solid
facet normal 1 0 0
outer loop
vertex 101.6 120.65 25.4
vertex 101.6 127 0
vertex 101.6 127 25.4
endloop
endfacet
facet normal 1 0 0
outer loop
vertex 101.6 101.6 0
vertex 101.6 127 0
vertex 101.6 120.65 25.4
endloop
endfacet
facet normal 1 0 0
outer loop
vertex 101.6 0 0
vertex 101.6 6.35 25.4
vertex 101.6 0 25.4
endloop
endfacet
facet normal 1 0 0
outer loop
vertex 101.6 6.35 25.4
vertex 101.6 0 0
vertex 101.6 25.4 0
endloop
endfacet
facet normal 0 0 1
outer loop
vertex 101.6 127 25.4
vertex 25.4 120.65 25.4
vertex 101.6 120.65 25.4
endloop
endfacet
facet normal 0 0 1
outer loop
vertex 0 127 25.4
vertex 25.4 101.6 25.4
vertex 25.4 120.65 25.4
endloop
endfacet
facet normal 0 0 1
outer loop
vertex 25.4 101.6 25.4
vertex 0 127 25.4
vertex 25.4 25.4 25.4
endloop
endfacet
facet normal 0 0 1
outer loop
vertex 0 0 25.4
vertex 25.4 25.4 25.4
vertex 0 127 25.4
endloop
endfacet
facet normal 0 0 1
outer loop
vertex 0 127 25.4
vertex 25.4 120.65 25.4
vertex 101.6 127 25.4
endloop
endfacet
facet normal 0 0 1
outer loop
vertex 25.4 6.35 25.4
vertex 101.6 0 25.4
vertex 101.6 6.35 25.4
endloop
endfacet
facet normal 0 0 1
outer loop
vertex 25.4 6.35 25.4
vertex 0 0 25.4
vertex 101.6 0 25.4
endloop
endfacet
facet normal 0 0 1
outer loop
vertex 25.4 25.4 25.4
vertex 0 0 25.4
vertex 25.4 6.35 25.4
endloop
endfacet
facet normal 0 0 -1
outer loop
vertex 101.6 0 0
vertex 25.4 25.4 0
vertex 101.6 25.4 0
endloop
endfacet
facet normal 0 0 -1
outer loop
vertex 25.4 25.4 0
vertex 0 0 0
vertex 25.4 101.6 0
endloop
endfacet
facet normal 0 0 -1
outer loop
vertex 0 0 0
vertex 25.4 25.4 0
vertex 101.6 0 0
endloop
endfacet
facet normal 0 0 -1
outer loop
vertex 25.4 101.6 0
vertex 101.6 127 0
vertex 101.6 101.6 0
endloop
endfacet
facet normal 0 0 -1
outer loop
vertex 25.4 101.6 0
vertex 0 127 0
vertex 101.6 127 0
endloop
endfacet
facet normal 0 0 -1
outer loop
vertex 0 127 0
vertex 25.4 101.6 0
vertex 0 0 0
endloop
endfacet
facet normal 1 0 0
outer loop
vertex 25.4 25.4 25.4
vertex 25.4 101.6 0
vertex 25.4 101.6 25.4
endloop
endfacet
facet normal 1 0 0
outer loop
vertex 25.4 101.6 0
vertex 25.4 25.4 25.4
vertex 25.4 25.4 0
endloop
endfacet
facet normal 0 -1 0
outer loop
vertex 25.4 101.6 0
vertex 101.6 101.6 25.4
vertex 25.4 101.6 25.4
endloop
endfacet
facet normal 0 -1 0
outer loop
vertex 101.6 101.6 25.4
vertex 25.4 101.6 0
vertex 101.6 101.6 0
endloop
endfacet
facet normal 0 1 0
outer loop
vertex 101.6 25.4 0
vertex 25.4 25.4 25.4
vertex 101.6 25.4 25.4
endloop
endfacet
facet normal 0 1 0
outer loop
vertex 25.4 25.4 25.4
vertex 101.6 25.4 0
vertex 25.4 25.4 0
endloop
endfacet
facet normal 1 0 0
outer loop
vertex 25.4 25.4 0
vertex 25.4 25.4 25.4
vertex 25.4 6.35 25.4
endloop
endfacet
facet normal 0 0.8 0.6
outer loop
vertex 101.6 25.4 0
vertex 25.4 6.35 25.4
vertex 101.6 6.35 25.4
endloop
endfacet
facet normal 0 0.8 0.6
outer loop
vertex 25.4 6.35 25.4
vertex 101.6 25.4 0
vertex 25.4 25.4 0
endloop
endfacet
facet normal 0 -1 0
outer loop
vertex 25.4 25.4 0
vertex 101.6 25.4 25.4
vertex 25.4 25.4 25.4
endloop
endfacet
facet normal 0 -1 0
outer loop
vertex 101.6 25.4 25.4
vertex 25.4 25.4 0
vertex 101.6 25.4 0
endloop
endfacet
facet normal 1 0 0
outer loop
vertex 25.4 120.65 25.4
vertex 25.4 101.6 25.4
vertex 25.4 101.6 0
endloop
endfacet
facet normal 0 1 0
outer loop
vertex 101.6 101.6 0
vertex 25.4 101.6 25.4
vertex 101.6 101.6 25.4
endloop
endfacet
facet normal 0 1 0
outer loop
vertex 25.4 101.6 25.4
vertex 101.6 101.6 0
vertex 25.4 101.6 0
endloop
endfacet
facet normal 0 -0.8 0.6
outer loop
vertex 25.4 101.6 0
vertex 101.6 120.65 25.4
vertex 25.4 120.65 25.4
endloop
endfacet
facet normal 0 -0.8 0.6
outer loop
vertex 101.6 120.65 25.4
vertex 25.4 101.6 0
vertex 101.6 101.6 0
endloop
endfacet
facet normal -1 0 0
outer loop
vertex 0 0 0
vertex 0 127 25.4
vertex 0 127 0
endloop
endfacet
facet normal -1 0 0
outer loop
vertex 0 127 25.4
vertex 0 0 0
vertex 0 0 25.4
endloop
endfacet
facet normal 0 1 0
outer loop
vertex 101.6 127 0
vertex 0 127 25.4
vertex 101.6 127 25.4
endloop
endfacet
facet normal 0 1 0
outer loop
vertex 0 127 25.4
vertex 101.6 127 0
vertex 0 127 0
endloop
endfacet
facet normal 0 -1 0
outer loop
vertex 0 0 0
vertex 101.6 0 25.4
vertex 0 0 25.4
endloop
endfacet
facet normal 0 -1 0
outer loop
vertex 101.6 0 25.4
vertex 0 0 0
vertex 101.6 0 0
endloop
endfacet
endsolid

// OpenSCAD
INCH = 25.4;
EPS = 0.01;

difference() {
    cube([4*INCH, 5*INCH, 1*INCH]);
    
    union() {

        color("blue") translate([1*INCH, 1*INCH, 0]) {
            cube([3*INCH, 3*INCH, 1*INCH]);
        }

        color("red") 
        translate([1*INCH, 1/4*INCH, 1*INCH])
        rotate([0 ,90,0])
        linear_extrude(height = 3*INCH, center = false) {
            // Define the triangle in the YZ plane
            polygon(points = [
                [0, 0],    // First point (Y, Z) = (0, 0)
                [0, 3/4*INCH],    // Second point (Y, Z) = (0, 1)
                [INCH, 3/4*INCH]   // Third point (Y, Z) = (3/4, 1)
            ]);
        }

        color("red") 
        translate([1*INCH, 19/4*INCH, 1*INCH])
        rotate([0 ,90,0])
        linear_extrude(height = 3*INCH, center = false) {
            // Define the triangle in the YZ plane
            polygon(points = [
                [0, 0],    // First point (Y, Z) = (0, 0)
                [0, -3/4*INCH],    // Second point (Y, Z) = (0, 1)
                [INCH, -3/4*INCH]   // Third point (Y, Z) = (3/4, 1)
            ]);
        }
    }
}
